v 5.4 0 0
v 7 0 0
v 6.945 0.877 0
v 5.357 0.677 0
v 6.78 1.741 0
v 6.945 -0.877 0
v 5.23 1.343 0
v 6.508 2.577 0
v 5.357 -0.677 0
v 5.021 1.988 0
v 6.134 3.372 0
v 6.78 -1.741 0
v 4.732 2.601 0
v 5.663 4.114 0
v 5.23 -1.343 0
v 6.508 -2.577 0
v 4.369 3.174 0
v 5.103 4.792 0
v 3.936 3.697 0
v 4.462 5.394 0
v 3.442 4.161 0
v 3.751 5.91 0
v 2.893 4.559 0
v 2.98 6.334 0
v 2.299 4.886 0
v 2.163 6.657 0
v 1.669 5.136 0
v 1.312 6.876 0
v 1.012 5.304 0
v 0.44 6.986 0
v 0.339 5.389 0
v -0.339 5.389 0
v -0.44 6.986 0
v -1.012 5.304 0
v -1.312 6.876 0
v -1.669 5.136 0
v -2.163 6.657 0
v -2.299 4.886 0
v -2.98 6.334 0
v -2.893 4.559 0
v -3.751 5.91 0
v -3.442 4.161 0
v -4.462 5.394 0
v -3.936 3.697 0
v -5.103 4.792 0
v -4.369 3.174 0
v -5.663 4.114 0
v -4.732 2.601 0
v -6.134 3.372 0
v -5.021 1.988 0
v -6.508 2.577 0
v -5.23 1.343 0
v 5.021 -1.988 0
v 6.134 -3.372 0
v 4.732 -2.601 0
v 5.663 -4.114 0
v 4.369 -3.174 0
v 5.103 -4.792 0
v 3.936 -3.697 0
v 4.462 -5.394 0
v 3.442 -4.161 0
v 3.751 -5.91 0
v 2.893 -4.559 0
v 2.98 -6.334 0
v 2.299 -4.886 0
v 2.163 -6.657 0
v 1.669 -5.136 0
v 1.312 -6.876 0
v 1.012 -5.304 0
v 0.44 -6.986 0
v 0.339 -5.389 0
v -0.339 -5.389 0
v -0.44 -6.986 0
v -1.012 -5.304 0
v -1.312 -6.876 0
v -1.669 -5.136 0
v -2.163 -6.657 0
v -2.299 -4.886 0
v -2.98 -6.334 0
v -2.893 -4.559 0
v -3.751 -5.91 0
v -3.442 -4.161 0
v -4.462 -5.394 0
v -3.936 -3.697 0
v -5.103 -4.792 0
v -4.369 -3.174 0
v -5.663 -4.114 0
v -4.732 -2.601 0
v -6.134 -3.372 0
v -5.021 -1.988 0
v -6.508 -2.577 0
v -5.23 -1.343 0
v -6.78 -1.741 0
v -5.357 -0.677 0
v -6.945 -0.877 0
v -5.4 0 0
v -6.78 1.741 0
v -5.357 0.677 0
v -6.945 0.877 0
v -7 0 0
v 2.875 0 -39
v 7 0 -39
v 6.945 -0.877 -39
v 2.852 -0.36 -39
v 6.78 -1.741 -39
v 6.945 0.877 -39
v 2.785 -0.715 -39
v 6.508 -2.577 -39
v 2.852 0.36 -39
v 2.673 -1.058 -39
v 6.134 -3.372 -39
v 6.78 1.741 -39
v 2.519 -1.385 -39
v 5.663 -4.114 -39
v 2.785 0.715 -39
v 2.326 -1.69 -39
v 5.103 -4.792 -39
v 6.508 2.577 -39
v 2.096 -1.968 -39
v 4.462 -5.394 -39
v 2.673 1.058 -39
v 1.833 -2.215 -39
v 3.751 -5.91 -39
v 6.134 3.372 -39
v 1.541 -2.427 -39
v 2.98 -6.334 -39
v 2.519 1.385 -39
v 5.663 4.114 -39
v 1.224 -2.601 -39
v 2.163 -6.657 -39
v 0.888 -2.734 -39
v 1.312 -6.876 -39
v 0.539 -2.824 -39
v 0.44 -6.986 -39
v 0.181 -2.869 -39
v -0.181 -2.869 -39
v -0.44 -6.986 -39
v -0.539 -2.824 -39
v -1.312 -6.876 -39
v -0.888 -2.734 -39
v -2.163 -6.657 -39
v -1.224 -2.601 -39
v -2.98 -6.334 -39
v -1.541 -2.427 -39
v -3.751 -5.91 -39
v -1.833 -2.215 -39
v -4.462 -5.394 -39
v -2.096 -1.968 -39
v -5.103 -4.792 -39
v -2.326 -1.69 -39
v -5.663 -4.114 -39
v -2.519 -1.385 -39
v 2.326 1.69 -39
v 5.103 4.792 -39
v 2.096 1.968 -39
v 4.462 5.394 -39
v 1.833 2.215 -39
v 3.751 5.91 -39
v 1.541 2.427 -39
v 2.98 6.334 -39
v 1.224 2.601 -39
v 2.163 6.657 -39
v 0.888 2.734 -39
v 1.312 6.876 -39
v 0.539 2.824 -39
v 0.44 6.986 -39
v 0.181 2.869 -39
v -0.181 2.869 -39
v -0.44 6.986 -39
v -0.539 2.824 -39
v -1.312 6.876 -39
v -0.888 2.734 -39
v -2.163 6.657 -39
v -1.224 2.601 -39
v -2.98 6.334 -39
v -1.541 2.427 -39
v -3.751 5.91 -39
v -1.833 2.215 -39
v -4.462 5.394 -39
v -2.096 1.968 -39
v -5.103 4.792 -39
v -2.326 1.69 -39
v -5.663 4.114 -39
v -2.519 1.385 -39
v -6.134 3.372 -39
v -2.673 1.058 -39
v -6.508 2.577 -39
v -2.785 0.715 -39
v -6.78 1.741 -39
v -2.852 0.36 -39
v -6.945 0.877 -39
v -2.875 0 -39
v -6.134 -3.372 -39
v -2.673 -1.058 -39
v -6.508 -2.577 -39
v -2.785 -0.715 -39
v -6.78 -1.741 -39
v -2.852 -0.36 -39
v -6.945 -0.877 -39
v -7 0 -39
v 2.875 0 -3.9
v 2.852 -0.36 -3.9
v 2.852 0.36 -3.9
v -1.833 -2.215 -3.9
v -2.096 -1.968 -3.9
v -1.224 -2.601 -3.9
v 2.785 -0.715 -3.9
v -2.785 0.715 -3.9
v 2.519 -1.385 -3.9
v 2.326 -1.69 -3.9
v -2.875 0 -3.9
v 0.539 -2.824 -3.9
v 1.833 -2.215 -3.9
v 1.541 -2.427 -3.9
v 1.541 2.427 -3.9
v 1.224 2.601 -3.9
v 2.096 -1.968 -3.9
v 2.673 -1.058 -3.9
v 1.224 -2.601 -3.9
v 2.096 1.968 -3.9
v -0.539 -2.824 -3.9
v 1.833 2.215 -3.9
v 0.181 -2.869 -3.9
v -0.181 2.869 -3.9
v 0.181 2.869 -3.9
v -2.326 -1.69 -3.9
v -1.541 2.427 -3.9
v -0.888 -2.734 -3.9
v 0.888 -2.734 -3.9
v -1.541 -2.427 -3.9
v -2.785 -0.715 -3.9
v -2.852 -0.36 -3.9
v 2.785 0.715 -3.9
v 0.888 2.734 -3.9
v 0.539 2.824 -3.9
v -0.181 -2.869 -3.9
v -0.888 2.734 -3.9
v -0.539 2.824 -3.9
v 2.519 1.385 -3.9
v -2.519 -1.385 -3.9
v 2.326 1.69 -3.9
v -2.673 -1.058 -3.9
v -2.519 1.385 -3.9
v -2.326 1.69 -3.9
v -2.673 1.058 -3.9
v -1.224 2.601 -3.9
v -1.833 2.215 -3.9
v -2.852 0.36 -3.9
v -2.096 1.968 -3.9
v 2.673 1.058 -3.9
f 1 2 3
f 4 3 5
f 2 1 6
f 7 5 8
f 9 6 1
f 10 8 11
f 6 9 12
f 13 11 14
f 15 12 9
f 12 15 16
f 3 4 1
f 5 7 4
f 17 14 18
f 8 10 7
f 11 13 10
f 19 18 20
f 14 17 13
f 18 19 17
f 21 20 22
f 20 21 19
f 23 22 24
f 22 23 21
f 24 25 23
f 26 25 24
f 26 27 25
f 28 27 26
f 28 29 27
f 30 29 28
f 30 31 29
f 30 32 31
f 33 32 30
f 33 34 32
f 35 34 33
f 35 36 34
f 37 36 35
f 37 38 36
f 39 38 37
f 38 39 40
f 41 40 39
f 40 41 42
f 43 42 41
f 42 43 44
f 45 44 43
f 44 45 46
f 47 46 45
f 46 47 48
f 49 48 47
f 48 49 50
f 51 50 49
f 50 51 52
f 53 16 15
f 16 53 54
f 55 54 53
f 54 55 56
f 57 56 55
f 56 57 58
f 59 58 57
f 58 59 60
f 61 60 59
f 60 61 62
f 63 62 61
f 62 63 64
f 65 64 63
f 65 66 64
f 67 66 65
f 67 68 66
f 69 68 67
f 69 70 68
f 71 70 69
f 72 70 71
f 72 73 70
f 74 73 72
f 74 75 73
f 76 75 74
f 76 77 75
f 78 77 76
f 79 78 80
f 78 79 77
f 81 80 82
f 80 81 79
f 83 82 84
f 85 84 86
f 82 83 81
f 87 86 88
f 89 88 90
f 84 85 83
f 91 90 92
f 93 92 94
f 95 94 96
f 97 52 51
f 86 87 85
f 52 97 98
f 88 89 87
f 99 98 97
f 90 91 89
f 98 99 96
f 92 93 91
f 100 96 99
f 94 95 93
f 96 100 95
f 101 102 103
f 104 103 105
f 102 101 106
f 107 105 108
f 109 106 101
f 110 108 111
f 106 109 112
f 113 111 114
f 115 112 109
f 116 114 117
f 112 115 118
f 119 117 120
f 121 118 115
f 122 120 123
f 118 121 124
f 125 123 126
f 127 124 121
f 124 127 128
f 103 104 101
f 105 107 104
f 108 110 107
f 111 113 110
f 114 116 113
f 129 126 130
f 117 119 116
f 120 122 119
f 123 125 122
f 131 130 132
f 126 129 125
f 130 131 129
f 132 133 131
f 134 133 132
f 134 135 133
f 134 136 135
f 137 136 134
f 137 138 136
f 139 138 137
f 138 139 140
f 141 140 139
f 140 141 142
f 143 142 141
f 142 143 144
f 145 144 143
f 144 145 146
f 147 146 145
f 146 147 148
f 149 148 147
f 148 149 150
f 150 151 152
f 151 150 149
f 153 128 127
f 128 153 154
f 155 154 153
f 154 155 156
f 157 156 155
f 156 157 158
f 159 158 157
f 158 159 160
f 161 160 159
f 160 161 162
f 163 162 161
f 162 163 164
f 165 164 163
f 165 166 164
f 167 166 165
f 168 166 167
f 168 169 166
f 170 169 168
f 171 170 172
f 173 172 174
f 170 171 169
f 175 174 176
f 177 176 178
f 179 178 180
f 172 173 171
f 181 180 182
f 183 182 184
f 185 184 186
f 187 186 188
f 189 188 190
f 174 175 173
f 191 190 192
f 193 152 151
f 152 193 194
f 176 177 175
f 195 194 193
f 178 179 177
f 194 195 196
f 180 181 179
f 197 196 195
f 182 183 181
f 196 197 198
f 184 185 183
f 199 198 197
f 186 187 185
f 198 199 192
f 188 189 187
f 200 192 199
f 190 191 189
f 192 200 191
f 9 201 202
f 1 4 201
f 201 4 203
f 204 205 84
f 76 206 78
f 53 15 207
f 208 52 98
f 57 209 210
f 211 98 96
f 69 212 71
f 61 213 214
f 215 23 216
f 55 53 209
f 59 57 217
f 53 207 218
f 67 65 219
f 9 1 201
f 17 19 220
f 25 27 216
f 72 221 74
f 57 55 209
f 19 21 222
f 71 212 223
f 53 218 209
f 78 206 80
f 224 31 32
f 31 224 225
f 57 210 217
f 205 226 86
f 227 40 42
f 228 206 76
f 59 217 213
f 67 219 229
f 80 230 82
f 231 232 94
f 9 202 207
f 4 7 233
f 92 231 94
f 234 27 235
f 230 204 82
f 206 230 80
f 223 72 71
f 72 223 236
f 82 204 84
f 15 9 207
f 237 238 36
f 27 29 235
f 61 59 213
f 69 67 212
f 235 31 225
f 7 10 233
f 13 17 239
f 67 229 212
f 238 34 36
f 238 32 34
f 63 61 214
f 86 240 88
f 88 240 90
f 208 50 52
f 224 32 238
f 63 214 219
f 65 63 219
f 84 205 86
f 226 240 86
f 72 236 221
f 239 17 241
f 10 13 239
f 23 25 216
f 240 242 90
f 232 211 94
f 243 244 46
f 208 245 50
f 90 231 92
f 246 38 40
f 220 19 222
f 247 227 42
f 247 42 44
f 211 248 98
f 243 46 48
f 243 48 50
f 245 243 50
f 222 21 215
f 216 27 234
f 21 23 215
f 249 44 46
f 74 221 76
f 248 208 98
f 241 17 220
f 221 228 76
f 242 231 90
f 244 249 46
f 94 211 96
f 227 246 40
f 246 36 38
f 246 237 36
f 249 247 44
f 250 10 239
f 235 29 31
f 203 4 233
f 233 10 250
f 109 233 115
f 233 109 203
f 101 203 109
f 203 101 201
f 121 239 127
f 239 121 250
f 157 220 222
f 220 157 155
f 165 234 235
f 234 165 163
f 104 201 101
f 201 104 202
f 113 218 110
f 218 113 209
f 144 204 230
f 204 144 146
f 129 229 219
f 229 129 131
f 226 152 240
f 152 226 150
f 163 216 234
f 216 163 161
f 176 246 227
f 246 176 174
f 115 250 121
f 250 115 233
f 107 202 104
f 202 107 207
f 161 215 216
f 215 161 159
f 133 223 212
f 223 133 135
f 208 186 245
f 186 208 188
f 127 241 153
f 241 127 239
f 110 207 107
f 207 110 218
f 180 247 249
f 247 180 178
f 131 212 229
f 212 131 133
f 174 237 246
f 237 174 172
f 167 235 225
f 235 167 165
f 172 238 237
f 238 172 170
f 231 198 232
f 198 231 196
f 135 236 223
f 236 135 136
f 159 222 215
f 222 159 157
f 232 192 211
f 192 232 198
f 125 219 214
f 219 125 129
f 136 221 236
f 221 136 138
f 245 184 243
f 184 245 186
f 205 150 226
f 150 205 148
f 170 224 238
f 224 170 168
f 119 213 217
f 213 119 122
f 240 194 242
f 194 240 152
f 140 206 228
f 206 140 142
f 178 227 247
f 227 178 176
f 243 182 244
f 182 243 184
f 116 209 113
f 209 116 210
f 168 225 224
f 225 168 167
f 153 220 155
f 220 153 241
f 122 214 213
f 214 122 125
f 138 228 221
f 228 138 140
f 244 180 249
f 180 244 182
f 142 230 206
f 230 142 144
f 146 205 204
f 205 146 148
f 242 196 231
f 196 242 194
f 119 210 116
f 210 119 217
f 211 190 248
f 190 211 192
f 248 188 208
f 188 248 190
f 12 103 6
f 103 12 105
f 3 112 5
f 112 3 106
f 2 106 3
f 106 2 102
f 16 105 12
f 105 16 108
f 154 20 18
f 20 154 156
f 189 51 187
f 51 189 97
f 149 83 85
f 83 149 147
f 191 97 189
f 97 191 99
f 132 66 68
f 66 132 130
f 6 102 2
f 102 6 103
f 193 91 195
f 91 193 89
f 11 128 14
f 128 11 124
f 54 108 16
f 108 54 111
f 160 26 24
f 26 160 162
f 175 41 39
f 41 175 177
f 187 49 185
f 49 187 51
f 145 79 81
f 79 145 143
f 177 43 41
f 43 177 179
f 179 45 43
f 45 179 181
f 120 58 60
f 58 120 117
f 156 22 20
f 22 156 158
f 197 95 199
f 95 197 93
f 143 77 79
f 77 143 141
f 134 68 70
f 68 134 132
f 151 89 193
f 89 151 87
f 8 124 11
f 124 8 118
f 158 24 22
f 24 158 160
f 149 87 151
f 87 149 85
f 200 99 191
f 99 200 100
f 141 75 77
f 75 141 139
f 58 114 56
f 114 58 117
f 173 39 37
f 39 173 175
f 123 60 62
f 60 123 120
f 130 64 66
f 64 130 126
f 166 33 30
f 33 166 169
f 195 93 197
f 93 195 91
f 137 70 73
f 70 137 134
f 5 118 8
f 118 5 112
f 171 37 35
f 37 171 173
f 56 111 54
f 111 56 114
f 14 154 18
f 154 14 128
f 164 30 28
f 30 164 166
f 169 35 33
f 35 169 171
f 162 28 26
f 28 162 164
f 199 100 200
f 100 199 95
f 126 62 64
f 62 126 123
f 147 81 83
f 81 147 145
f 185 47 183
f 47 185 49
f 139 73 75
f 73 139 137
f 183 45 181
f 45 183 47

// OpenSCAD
$fn = 50;


difference() {
	union() {
		translate(v = [0, 0, -39.0000000000]) {
			cylinder(h = 39, r = 7.0000000000);
		}
		cylinder(h = 0, r = 17.0000000000);
	}
	union() {
		translate(v = [0, 0, 0]) {
			rotate(a = [0, 0, 0]) {
				difference() {
					union() {
						#translate(v = [0, 0, -39.0000000000]) {
							cylinder(h = 39, r = 2.6000000000);
						}
						#translate(v = [0, 0, -3.9000000000]) {
							cylinder(h = 3.9000000000, r1 = 2.8750000000, r2 = 5.4000000000);
						}
						#translate(v = [0, 0, -39.0000000000]) {
							cylinder(h = 39, r = 2.8750000000);
						}
						#translate(v = [0, 0, -39.0000000000]) {
							cylinder(h = 39, r = 2.6000000000);
						}
					}
					union();
				}
			}
		}
	}
}
